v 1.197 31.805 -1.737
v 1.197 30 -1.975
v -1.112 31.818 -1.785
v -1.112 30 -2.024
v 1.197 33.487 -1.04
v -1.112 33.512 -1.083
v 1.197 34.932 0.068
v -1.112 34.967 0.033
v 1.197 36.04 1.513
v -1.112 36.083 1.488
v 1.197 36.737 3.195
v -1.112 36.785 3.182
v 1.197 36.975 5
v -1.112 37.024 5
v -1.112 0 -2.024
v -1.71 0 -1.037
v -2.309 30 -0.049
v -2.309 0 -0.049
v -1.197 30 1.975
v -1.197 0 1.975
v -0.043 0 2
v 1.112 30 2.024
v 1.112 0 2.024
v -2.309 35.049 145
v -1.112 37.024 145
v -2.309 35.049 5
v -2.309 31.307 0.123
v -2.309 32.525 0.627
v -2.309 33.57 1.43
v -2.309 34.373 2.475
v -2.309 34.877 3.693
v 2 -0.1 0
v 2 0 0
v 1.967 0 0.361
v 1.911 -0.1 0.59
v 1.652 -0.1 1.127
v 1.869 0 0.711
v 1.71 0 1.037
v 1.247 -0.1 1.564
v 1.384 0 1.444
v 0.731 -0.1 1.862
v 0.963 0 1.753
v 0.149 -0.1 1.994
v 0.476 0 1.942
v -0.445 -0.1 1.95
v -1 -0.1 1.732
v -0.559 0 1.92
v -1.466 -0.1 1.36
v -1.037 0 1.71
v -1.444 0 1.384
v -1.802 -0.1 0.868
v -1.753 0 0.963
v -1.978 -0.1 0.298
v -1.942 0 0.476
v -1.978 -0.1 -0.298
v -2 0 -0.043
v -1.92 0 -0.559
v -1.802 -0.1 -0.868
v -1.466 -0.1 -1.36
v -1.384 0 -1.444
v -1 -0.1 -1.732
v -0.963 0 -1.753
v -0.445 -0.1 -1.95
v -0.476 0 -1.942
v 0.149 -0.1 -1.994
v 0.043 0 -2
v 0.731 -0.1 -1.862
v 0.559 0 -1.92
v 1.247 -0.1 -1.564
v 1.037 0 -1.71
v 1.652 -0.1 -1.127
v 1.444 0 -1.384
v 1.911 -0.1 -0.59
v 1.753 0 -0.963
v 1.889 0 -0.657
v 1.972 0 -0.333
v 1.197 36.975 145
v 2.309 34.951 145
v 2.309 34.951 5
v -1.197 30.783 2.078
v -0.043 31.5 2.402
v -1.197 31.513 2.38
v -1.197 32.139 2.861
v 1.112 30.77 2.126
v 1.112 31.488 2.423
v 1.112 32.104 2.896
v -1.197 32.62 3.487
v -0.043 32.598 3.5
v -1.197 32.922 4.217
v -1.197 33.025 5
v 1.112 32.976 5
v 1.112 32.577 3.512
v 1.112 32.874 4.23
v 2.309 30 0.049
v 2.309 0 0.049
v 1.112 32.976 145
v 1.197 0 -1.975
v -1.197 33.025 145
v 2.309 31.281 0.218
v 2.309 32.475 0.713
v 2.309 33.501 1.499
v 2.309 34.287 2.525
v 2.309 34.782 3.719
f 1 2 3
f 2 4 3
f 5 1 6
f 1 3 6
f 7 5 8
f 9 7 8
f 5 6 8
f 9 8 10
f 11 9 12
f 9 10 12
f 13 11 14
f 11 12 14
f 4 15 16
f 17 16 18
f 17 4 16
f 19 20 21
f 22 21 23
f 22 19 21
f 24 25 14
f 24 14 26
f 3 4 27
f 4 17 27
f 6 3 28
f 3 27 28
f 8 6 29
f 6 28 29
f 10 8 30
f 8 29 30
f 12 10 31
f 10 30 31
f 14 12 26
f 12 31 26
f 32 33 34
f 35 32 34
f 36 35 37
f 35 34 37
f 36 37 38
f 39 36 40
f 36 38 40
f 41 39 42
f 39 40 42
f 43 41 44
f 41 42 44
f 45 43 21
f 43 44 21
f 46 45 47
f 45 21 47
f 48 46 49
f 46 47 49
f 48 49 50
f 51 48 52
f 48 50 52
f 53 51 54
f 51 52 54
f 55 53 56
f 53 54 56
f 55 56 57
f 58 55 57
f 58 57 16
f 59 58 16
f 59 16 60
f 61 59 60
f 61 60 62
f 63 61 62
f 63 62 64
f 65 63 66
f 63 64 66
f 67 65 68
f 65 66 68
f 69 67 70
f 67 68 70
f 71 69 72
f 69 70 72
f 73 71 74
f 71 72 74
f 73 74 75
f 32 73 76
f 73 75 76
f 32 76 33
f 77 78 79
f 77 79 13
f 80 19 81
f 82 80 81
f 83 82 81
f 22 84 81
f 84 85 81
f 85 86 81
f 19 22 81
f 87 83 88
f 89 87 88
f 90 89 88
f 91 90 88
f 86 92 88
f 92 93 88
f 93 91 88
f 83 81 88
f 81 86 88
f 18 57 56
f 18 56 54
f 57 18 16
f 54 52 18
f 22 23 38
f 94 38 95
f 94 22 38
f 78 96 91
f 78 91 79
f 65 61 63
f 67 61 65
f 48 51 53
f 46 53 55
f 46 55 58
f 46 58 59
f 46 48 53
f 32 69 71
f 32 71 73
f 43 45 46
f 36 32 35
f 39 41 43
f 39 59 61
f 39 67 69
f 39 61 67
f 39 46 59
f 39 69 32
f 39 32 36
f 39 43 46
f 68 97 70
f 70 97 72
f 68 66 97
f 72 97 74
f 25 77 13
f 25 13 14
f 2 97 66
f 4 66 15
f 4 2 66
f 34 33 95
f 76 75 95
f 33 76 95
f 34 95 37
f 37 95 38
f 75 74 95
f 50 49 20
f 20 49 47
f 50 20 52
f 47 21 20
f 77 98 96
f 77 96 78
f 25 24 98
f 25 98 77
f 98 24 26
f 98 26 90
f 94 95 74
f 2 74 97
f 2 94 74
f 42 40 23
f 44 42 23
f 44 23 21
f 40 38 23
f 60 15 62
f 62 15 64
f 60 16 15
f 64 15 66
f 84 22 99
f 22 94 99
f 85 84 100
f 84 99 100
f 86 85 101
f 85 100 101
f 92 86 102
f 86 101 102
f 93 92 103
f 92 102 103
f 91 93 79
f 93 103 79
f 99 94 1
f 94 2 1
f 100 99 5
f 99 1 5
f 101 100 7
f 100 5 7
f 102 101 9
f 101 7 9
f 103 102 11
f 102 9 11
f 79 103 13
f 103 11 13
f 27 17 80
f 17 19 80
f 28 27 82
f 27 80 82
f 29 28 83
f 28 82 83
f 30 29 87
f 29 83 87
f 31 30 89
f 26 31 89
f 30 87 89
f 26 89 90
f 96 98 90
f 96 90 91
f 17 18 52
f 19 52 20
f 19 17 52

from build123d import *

# Parameters (mm, degrees)
SKETCH2_R           = 2
BOSS_EXTRUDE1_DEPTH = 0.1


with BuildPart() as part:
    # Sweep1: sweep along a curve in space
    with BuildLine() as sweep1_path:
        Line((0, 0, 0), (0, 30, 0))
        ThreePointArc((0, 35, 5), (0, 33.535533906, 1.464466094), (0, 30, 0))
        Line((0, 35, 5), (0, 35, 145))
    # Sketch1 → Sweep1 (sweep)
    with BuildSketch(Plane(origin=(0, 0, 0), x_dir=(-1, 0, 0), z_dir=(0, 1, 0))):
        Polygon((2.308874637, -0.049307649), (1.197138995, 1.974890265), (-1.111735642, 2.024197914), (-2.308874637, 0.049307649), (-1.197138995, -1.974890265), (1.111735642, -2.024197914), align=None)
    sweep(path=sweep1_path.line)

    # Sketch2 → Boss-Extrude1 (add)
    with BuildSketch(Plane.XZ):
        Circle(SKETCH2_R)
    extrude(amount=BOSS_EXTRUDE1_DEPTH)


solid = part.part
